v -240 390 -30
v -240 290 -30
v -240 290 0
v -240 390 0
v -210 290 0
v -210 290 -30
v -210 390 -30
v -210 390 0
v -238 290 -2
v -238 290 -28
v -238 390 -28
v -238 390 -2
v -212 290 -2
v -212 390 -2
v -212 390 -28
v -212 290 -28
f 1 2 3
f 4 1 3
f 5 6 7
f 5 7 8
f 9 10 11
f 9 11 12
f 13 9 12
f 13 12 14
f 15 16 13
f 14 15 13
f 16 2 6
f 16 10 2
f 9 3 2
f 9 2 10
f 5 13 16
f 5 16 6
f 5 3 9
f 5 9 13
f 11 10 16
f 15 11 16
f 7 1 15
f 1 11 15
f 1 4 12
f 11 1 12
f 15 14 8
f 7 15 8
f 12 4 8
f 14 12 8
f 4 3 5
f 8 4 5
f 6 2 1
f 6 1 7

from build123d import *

# Parameters (mm, degrees)
SKETCH001_W   = 30
SKETCH001_H   = 30
SKETCH001_W_2 = 26
SKETCH001_H_2 = 26
PAD001_DEPTH  = 100


with BuildPart() as part:
    # Sketch001 → Pad001 (new body)
    with BuildSketch(Plane.XZ):
        with Locations((15, -15)):
            Rectangle(SKETCH001_W, SKETCH001_H)
        with Locations((15, -15)):
            Rectangle(SKETCH001_W_2, SKETCH001_H_2, mode=Mode.SUBTRACT)
    extrude(amount=PAD001_DEPTH)


with BuildPart() as part_1:
    # Body001 placement: moved
    add(part.part.moved(Location((-240, 390, 0))))


solid = part_1.part
